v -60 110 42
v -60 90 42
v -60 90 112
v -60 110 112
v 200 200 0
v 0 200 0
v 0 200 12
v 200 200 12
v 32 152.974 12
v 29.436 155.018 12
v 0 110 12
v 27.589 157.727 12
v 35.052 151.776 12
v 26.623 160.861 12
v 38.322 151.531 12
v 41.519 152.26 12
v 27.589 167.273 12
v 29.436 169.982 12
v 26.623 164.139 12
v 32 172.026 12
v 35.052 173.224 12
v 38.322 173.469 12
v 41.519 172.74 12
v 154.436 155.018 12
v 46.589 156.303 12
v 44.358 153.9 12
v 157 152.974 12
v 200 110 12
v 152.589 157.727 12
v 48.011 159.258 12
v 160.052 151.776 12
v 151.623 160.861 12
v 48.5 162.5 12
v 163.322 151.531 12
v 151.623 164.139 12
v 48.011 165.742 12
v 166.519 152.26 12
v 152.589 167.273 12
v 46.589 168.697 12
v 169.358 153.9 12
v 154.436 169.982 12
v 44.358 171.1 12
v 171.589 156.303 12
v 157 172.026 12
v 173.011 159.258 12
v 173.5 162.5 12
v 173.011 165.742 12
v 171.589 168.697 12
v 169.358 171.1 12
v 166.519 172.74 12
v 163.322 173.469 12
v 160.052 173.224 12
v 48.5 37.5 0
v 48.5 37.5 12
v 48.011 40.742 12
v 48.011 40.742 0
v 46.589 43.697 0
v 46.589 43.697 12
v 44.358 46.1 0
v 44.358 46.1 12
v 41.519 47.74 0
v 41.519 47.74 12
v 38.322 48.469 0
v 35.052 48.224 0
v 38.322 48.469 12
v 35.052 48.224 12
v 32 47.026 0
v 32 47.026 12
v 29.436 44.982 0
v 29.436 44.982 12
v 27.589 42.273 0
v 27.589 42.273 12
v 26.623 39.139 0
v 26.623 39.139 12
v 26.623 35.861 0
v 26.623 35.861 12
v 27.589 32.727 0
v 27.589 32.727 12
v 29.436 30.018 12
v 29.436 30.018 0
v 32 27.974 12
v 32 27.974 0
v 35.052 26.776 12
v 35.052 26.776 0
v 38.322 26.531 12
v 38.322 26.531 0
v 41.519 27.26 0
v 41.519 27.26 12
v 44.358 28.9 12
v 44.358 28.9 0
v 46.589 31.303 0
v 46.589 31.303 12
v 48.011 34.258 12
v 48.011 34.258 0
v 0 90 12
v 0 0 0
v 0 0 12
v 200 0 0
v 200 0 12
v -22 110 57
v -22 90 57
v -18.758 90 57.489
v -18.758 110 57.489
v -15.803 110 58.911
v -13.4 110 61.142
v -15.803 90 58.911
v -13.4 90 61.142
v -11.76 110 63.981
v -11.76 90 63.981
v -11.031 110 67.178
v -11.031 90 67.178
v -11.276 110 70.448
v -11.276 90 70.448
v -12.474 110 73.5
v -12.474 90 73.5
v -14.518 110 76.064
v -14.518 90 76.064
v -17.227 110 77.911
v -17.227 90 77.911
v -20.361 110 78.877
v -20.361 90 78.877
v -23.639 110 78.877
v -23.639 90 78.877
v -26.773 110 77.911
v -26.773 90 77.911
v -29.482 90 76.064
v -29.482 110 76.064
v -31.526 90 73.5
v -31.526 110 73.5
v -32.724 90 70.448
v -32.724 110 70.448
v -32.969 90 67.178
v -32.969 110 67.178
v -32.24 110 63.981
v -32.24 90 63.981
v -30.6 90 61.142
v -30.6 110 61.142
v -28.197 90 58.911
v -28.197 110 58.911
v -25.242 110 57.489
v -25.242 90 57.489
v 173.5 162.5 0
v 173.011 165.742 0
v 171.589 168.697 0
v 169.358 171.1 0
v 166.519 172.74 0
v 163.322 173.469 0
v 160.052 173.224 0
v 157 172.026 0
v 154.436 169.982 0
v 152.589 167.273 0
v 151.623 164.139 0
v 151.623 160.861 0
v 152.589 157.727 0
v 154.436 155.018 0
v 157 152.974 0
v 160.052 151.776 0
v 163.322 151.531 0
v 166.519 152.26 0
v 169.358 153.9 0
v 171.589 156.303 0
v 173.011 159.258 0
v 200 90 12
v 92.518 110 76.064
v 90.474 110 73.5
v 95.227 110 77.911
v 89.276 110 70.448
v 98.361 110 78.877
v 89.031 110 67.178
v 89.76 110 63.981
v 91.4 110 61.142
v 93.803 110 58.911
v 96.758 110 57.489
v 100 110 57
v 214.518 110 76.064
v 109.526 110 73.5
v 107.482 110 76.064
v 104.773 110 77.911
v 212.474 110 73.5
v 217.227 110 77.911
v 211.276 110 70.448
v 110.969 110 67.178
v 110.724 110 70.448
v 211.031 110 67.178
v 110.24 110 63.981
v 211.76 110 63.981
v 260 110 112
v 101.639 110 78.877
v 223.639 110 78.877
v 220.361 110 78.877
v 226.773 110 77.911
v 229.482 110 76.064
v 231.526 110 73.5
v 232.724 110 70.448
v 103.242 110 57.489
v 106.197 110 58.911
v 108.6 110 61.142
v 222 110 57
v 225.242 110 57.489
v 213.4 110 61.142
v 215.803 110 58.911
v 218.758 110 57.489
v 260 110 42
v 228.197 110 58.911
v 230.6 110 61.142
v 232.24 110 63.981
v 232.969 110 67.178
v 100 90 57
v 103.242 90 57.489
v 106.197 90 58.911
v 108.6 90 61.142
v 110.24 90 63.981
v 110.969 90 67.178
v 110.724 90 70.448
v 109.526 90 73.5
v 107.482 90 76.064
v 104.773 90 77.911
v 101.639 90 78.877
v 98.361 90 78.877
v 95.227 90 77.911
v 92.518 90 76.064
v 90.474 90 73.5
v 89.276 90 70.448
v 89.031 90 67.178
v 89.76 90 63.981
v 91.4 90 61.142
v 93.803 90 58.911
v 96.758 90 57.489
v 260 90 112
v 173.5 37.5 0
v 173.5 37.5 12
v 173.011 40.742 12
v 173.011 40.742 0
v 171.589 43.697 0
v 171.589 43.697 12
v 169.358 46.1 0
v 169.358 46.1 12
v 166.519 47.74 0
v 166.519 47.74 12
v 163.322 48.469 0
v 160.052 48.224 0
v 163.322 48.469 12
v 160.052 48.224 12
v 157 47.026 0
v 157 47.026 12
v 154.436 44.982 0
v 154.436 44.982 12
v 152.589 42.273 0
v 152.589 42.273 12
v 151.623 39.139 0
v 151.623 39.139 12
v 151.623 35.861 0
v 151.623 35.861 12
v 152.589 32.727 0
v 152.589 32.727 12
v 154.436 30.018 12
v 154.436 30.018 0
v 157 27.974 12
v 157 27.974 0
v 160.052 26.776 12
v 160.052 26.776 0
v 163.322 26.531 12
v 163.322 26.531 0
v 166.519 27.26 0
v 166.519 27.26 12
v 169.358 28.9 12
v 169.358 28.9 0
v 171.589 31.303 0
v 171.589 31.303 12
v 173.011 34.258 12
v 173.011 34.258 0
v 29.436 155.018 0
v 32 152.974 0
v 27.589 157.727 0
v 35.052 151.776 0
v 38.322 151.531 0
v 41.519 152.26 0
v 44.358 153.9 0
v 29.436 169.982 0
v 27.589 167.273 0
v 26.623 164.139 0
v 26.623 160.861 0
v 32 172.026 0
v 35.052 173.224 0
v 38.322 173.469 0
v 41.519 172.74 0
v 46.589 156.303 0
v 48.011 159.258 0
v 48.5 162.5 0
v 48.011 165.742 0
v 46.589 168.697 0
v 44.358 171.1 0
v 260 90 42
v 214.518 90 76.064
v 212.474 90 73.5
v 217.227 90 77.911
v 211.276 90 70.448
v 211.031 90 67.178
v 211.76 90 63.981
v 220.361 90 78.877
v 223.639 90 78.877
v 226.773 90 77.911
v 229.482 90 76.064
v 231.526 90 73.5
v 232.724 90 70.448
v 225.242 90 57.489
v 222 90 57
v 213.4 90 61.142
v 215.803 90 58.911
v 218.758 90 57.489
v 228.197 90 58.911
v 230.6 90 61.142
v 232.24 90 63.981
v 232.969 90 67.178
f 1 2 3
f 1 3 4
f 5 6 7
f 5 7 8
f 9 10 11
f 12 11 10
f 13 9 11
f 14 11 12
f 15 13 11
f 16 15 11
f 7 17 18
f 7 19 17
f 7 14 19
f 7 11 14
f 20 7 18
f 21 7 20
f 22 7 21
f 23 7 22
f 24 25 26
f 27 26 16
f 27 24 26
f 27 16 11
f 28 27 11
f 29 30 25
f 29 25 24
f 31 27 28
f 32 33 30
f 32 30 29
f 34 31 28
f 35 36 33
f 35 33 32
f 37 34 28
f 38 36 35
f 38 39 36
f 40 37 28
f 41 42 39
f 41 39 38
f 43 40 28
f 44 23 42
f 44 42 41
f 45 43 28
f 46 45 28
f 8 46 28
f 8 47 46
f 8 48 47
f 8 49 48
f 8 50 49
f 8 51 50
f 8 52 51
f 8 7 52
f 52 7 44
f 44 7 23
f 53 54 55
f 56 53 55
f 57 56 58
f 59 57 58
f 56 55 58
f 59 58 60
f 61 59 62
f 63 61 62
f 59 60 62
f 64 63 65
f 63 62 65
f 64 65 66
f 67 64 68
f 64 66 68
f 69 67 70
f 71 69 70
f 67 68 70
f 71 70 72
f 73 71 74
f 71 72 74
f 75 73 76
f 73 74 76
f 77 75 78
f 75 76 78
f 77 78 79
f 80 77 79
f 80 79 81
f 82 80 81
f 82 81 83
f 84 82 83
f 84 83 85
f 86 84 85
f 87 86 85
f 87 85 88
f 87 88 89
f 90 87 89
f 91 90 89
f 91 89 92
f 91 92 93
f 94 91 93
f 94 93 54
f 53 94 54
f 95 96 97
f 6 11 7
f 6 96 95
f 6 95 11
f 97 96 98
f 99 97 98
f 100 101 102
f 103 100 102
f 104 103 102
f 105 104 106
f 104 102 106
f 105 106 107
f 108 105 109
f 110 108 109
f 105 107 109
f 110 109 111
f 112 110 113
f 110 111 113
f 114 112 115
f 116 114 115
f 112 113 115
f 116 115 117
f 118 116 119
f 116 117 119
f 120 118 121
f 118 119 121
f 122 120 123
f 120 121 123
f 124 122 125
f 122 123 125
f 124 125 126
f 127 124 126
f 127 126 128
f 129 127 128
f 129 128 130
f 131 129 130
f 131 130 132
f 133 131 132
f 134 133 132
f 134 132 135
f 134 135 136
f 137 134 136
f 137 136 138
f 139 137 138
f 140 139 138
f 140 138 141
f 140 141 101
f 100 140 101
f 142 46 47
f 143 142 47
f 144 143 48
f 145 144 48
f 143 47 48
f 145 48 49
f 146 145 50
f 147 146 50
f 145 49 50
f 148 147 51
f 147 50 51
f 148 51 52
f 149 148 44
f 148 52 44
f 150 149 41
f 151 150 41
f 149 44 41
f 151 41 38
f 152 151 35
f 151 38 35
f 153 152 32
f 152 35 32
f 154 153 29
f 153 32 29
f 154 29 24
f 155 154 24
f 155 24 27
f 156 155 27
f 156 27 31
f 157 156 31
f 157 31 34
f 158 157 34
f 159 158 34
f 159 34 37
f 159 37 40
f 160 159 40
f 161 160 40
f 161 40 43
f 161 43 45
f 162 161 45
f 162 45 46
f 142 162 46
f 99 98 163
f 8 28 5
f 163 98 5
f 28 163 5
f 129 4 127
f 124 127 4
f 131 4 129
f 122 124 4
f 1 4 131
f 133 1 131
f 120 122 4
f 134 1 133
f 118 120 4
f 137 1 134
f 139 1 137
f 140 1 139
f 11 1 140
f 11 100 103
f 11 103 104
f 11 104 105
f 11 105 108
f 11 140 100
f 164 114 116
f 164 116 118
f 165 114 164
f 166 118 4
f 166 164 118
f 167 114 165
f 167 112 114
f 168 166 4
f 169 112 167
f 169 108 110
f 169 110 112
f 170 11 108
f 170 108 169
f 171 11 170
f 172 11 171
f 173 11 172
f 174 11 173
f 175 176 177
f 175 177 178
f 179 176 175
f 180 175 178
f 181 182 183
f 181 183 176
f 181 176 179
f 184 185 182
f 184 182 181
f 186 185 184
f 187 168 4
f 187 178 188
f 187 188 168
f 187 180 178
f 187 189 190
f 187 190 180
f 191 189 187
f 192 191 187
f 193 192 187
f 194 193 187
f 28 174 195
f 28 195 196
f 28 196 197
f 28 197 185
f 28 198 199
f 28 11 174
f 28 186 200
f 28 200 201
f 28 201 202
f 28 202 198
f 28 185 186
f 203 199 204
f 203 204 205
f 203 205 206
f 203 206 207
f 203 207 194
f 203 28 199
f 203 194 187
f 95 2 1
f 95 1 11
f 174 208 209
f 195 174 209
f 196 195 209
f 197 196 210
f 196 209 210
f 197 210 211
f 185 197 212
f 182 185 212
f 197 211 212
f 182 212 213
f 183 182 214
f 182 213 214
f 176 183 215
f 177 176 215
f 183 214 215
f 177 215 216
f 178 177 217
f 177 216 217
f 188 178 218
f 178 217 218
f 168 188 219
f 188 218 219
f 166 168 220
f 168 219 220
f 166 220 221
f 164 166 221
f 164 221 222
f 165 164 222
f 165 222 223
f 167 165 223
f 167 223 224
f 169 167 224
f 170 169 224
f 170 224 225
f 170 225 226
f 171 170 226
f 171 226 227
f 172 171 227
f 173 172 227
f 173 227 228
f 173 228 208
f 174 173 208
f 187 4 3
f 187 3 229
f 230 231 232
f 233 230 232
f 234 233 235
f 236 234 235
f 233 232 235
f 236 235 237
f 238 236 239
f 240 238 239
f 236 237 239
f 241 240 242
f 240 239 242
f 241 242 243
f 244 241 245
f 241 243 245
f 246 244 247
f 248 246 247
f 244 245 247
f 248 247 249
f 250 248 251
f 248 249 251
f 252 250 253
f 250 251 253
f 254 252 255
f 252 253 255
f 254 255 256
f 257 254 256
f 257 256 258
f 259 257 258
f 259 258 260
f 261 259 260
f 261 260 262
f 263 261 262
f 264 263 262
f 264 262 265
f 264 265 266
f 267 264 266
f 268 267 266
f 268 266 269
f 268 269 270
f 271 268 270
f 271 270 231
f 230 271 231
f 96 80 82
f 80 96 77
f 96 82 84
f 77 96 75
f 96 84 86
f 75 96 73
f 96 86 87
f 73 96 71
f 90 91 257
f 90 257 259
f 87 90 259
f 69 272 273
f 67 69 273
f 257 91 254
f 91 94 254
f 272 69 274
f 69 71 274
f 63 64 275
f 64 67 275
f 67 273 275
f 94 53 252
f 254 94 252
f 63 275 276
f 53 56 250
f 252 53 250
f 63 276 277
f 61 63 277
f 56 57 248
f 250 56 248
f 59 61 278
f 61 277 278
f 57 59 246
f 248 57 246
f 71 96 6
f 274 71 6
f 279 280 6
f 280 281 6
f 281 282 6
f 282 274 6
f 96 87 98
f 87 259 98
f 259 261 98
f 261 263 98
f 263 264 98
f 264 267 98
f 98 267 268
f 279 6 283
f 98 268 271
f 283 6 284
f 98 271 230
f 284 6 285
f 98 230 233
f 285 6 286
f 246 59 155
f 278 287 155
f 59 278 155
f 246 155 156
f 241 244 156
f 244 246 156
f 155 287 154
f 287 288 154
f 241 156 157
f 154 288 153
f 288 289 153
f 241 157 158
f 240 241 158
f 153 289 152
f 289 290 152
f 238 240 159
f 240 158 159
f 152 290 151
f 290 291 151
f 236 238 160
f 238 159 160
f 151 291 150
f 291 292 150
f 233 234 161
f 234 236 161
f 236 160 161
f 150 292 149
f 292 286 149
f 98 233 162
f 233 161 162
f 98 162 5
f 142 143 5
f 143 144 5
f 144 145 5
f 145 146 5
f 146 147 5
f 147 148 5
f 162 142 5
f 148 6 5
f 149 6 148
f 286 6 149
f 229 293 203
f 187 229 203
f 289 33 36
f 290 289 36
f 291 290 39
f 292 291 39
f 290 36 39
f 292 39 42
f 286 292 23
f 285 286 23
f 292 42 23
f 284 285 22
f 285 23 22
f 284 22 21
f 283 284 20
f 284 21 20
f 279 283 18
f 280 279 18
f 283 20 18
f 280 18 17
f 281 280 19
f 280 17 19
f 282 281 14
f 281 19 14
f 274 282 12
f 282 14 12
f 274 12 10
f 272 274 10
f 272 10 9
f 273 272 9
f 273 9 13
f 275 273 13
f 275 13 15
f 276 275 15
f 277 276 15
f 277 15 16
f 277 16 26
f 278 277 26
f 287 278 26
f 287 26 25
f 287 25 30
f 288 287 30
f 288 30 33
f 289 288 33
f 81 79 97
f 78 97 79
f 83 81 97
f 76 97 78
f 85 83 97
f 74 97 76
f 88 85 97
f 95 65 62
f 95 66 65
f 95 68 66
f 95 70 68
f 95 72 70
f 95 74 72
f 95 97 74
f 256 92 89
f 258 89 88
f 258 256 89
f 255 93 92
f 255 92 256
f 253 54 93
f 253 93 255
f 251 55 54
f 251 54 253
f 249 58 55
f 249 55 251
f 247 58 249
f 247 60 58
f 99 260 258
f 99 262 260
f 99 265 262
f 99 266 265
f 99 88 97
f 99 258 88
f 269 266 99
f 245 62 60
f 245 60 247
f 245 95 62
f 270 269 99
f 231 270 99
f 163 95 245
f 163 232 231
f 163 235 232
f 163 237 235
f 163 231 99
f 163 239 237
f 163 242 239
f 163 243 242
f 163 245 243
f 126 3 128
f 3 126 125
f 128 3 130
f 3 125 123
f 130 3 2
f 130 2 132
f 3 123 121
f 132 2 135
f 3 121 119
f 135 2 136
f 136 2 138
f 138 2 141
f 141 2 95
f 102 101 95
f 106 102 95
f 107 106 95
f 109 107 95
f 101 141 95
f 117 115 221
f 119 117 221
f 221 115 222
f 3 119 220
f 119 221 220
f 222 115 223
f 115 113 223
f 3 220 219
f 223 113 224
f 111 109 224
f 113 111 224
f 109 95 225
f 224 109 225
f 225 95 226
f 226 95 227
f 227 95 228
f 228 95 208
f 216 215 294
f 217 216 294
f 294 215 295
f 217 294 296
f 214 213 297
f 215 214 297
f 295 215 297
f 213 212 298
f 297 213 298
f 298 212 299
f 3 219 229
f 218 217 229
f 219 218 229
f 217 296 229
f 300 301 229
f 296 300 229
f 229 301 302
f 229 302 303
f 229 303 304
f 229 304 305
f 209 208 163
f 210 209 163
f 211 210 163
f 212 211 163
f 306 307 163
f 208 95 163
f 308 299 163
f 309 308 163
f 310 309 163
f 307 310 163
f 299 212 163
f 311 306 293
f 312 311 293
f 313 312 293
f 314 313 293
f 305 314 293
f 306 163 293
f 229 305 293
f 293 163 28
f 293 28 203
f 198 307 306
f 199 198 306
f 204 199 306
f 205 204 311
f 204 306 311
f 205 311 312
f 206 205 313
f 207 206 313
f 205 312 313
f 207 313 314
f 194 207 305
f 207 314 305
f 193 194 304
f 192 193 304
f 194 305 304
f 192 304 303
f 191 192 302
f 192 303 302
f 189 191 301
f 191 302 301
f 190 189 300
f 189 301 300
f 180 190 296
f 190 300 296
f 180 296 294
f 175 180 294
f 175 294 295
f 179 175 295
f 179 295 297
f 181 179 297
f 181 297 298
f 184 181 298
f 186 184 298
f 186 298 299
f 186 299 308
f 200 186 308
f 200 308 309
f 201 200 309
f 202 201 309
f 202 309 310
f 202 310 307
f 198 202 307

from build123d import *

# Parameters (mm, degrees)
SKETCH_1_W                  = 200
SKETCH_1_H                  = 200
EXTRUDE_1_DEPTH             = 12
SKETCH_2_R                  = 11
CUT_EXTRUDE_2_DEPTH         = 284.097156468
PATTERN_LINEAR_1_COUNT      = 2
PATTERN_LINEAR_1_PITCH      = 125
PATTERN_LINEAR_1_COUNT_DIR2 = 2
PATTERN_LINEAR_1_PITCH_DIR2 = 125
SKETCH_3_W                  = 320
SKETCH_3_H                  = 20
EXTRUDE_3_DEPTH             = 100
CUT_EXTRUDE_4_DEPTH         = 304.716973513
SKETCH_6_R                  = 11
CUT_EXTRUDE_6_DEPTH         = 304.716973513
PATTERN_LINEAR_3_COUNT      = 3
PATTERN_LINEAR_3_PITCH      = 122


with BuildPart() as part:
    # 草图1 → 拉伸1 (new body)
    with BuildSketch(Plane.XY):
        with Locations((100, 100)):
            Rectangle(SKETCH_1_W, SKETCH_1_H)
    extrude(amount=EXTRUDE_1_DEPTH)

    # 草图2 → 拉伸2 (cut, through all)
    with BuildSketch(Plane.XY.offset(12)):
        with Locations((37.5, 37.5)):
            Circle(SKETCH_2_R)
    cut_extrude_2 = extrude(amount=-CUT_EXTRUDE_2_DEPTH, mode=Mode.SUBTRACT)

    # 阵列(线性)1: Cut-Extrude 2 2 × 2
    with Locations(*[(i * PATTERN_LINEAR_1_PITCH, j * PATTERN_LINEAR_1_PITCH_DIR2, 0) for i in range(PATTERN_LINEAR_1_COUNT) for j in range(PATTERN_LINEAR_1_COUNT_DIR2) if (i, j) != (0, 0)]):
        add(cut_extrude_2, mode=Mode.SUBTRACT)

    # 草图3 → 拉伸3 (add)
    with BuildSketch(Plane.XY.offset(12)):
        with Locations((100, 100)):
            Rectangle(SKETCH_3_W, SKETCH_3_H)
    extrude(amount=EXTRUDE_3_DEPTH)

    # 草图4 → 拉伸4 (cut, through all)
    with BuildSketch(Plane.XZ.offset(-90)):
        Polygon((200, 12), (260, 42), (260, 12), align=None)
        Polygon((-60, 42), (0, 12), (-60, 12), align=None)
    extrude(amount=-CUT_EXTRUDE_4_DEPTH, mode=Mode.SUBTRACT)

    # 草图6 → 拉伸6 (cut, through all)
    with BuildSketch(Plane.XZ.offset(-90)):
        with Locations(Location((-22, 68, 0), (0, 0, 270))):
            Circle(SKETCH_6_R)
    cut_extrude_6 = extrude(amount=-CUT_EXTRUDE_6_DEPTH, mode=Mode.SUBTRACT)

    # 阵列(线性)3: 拉伸6 ×3
    with Locations(*[(i * PATTERN_LINEAR_3_PITCH, 0, 0) for i in range(1, PATTERN_LINEAR_3_COUNT)]):
        add(cut_extrude_6, mode=Mode.SUBTRACT)


solid = part.part
